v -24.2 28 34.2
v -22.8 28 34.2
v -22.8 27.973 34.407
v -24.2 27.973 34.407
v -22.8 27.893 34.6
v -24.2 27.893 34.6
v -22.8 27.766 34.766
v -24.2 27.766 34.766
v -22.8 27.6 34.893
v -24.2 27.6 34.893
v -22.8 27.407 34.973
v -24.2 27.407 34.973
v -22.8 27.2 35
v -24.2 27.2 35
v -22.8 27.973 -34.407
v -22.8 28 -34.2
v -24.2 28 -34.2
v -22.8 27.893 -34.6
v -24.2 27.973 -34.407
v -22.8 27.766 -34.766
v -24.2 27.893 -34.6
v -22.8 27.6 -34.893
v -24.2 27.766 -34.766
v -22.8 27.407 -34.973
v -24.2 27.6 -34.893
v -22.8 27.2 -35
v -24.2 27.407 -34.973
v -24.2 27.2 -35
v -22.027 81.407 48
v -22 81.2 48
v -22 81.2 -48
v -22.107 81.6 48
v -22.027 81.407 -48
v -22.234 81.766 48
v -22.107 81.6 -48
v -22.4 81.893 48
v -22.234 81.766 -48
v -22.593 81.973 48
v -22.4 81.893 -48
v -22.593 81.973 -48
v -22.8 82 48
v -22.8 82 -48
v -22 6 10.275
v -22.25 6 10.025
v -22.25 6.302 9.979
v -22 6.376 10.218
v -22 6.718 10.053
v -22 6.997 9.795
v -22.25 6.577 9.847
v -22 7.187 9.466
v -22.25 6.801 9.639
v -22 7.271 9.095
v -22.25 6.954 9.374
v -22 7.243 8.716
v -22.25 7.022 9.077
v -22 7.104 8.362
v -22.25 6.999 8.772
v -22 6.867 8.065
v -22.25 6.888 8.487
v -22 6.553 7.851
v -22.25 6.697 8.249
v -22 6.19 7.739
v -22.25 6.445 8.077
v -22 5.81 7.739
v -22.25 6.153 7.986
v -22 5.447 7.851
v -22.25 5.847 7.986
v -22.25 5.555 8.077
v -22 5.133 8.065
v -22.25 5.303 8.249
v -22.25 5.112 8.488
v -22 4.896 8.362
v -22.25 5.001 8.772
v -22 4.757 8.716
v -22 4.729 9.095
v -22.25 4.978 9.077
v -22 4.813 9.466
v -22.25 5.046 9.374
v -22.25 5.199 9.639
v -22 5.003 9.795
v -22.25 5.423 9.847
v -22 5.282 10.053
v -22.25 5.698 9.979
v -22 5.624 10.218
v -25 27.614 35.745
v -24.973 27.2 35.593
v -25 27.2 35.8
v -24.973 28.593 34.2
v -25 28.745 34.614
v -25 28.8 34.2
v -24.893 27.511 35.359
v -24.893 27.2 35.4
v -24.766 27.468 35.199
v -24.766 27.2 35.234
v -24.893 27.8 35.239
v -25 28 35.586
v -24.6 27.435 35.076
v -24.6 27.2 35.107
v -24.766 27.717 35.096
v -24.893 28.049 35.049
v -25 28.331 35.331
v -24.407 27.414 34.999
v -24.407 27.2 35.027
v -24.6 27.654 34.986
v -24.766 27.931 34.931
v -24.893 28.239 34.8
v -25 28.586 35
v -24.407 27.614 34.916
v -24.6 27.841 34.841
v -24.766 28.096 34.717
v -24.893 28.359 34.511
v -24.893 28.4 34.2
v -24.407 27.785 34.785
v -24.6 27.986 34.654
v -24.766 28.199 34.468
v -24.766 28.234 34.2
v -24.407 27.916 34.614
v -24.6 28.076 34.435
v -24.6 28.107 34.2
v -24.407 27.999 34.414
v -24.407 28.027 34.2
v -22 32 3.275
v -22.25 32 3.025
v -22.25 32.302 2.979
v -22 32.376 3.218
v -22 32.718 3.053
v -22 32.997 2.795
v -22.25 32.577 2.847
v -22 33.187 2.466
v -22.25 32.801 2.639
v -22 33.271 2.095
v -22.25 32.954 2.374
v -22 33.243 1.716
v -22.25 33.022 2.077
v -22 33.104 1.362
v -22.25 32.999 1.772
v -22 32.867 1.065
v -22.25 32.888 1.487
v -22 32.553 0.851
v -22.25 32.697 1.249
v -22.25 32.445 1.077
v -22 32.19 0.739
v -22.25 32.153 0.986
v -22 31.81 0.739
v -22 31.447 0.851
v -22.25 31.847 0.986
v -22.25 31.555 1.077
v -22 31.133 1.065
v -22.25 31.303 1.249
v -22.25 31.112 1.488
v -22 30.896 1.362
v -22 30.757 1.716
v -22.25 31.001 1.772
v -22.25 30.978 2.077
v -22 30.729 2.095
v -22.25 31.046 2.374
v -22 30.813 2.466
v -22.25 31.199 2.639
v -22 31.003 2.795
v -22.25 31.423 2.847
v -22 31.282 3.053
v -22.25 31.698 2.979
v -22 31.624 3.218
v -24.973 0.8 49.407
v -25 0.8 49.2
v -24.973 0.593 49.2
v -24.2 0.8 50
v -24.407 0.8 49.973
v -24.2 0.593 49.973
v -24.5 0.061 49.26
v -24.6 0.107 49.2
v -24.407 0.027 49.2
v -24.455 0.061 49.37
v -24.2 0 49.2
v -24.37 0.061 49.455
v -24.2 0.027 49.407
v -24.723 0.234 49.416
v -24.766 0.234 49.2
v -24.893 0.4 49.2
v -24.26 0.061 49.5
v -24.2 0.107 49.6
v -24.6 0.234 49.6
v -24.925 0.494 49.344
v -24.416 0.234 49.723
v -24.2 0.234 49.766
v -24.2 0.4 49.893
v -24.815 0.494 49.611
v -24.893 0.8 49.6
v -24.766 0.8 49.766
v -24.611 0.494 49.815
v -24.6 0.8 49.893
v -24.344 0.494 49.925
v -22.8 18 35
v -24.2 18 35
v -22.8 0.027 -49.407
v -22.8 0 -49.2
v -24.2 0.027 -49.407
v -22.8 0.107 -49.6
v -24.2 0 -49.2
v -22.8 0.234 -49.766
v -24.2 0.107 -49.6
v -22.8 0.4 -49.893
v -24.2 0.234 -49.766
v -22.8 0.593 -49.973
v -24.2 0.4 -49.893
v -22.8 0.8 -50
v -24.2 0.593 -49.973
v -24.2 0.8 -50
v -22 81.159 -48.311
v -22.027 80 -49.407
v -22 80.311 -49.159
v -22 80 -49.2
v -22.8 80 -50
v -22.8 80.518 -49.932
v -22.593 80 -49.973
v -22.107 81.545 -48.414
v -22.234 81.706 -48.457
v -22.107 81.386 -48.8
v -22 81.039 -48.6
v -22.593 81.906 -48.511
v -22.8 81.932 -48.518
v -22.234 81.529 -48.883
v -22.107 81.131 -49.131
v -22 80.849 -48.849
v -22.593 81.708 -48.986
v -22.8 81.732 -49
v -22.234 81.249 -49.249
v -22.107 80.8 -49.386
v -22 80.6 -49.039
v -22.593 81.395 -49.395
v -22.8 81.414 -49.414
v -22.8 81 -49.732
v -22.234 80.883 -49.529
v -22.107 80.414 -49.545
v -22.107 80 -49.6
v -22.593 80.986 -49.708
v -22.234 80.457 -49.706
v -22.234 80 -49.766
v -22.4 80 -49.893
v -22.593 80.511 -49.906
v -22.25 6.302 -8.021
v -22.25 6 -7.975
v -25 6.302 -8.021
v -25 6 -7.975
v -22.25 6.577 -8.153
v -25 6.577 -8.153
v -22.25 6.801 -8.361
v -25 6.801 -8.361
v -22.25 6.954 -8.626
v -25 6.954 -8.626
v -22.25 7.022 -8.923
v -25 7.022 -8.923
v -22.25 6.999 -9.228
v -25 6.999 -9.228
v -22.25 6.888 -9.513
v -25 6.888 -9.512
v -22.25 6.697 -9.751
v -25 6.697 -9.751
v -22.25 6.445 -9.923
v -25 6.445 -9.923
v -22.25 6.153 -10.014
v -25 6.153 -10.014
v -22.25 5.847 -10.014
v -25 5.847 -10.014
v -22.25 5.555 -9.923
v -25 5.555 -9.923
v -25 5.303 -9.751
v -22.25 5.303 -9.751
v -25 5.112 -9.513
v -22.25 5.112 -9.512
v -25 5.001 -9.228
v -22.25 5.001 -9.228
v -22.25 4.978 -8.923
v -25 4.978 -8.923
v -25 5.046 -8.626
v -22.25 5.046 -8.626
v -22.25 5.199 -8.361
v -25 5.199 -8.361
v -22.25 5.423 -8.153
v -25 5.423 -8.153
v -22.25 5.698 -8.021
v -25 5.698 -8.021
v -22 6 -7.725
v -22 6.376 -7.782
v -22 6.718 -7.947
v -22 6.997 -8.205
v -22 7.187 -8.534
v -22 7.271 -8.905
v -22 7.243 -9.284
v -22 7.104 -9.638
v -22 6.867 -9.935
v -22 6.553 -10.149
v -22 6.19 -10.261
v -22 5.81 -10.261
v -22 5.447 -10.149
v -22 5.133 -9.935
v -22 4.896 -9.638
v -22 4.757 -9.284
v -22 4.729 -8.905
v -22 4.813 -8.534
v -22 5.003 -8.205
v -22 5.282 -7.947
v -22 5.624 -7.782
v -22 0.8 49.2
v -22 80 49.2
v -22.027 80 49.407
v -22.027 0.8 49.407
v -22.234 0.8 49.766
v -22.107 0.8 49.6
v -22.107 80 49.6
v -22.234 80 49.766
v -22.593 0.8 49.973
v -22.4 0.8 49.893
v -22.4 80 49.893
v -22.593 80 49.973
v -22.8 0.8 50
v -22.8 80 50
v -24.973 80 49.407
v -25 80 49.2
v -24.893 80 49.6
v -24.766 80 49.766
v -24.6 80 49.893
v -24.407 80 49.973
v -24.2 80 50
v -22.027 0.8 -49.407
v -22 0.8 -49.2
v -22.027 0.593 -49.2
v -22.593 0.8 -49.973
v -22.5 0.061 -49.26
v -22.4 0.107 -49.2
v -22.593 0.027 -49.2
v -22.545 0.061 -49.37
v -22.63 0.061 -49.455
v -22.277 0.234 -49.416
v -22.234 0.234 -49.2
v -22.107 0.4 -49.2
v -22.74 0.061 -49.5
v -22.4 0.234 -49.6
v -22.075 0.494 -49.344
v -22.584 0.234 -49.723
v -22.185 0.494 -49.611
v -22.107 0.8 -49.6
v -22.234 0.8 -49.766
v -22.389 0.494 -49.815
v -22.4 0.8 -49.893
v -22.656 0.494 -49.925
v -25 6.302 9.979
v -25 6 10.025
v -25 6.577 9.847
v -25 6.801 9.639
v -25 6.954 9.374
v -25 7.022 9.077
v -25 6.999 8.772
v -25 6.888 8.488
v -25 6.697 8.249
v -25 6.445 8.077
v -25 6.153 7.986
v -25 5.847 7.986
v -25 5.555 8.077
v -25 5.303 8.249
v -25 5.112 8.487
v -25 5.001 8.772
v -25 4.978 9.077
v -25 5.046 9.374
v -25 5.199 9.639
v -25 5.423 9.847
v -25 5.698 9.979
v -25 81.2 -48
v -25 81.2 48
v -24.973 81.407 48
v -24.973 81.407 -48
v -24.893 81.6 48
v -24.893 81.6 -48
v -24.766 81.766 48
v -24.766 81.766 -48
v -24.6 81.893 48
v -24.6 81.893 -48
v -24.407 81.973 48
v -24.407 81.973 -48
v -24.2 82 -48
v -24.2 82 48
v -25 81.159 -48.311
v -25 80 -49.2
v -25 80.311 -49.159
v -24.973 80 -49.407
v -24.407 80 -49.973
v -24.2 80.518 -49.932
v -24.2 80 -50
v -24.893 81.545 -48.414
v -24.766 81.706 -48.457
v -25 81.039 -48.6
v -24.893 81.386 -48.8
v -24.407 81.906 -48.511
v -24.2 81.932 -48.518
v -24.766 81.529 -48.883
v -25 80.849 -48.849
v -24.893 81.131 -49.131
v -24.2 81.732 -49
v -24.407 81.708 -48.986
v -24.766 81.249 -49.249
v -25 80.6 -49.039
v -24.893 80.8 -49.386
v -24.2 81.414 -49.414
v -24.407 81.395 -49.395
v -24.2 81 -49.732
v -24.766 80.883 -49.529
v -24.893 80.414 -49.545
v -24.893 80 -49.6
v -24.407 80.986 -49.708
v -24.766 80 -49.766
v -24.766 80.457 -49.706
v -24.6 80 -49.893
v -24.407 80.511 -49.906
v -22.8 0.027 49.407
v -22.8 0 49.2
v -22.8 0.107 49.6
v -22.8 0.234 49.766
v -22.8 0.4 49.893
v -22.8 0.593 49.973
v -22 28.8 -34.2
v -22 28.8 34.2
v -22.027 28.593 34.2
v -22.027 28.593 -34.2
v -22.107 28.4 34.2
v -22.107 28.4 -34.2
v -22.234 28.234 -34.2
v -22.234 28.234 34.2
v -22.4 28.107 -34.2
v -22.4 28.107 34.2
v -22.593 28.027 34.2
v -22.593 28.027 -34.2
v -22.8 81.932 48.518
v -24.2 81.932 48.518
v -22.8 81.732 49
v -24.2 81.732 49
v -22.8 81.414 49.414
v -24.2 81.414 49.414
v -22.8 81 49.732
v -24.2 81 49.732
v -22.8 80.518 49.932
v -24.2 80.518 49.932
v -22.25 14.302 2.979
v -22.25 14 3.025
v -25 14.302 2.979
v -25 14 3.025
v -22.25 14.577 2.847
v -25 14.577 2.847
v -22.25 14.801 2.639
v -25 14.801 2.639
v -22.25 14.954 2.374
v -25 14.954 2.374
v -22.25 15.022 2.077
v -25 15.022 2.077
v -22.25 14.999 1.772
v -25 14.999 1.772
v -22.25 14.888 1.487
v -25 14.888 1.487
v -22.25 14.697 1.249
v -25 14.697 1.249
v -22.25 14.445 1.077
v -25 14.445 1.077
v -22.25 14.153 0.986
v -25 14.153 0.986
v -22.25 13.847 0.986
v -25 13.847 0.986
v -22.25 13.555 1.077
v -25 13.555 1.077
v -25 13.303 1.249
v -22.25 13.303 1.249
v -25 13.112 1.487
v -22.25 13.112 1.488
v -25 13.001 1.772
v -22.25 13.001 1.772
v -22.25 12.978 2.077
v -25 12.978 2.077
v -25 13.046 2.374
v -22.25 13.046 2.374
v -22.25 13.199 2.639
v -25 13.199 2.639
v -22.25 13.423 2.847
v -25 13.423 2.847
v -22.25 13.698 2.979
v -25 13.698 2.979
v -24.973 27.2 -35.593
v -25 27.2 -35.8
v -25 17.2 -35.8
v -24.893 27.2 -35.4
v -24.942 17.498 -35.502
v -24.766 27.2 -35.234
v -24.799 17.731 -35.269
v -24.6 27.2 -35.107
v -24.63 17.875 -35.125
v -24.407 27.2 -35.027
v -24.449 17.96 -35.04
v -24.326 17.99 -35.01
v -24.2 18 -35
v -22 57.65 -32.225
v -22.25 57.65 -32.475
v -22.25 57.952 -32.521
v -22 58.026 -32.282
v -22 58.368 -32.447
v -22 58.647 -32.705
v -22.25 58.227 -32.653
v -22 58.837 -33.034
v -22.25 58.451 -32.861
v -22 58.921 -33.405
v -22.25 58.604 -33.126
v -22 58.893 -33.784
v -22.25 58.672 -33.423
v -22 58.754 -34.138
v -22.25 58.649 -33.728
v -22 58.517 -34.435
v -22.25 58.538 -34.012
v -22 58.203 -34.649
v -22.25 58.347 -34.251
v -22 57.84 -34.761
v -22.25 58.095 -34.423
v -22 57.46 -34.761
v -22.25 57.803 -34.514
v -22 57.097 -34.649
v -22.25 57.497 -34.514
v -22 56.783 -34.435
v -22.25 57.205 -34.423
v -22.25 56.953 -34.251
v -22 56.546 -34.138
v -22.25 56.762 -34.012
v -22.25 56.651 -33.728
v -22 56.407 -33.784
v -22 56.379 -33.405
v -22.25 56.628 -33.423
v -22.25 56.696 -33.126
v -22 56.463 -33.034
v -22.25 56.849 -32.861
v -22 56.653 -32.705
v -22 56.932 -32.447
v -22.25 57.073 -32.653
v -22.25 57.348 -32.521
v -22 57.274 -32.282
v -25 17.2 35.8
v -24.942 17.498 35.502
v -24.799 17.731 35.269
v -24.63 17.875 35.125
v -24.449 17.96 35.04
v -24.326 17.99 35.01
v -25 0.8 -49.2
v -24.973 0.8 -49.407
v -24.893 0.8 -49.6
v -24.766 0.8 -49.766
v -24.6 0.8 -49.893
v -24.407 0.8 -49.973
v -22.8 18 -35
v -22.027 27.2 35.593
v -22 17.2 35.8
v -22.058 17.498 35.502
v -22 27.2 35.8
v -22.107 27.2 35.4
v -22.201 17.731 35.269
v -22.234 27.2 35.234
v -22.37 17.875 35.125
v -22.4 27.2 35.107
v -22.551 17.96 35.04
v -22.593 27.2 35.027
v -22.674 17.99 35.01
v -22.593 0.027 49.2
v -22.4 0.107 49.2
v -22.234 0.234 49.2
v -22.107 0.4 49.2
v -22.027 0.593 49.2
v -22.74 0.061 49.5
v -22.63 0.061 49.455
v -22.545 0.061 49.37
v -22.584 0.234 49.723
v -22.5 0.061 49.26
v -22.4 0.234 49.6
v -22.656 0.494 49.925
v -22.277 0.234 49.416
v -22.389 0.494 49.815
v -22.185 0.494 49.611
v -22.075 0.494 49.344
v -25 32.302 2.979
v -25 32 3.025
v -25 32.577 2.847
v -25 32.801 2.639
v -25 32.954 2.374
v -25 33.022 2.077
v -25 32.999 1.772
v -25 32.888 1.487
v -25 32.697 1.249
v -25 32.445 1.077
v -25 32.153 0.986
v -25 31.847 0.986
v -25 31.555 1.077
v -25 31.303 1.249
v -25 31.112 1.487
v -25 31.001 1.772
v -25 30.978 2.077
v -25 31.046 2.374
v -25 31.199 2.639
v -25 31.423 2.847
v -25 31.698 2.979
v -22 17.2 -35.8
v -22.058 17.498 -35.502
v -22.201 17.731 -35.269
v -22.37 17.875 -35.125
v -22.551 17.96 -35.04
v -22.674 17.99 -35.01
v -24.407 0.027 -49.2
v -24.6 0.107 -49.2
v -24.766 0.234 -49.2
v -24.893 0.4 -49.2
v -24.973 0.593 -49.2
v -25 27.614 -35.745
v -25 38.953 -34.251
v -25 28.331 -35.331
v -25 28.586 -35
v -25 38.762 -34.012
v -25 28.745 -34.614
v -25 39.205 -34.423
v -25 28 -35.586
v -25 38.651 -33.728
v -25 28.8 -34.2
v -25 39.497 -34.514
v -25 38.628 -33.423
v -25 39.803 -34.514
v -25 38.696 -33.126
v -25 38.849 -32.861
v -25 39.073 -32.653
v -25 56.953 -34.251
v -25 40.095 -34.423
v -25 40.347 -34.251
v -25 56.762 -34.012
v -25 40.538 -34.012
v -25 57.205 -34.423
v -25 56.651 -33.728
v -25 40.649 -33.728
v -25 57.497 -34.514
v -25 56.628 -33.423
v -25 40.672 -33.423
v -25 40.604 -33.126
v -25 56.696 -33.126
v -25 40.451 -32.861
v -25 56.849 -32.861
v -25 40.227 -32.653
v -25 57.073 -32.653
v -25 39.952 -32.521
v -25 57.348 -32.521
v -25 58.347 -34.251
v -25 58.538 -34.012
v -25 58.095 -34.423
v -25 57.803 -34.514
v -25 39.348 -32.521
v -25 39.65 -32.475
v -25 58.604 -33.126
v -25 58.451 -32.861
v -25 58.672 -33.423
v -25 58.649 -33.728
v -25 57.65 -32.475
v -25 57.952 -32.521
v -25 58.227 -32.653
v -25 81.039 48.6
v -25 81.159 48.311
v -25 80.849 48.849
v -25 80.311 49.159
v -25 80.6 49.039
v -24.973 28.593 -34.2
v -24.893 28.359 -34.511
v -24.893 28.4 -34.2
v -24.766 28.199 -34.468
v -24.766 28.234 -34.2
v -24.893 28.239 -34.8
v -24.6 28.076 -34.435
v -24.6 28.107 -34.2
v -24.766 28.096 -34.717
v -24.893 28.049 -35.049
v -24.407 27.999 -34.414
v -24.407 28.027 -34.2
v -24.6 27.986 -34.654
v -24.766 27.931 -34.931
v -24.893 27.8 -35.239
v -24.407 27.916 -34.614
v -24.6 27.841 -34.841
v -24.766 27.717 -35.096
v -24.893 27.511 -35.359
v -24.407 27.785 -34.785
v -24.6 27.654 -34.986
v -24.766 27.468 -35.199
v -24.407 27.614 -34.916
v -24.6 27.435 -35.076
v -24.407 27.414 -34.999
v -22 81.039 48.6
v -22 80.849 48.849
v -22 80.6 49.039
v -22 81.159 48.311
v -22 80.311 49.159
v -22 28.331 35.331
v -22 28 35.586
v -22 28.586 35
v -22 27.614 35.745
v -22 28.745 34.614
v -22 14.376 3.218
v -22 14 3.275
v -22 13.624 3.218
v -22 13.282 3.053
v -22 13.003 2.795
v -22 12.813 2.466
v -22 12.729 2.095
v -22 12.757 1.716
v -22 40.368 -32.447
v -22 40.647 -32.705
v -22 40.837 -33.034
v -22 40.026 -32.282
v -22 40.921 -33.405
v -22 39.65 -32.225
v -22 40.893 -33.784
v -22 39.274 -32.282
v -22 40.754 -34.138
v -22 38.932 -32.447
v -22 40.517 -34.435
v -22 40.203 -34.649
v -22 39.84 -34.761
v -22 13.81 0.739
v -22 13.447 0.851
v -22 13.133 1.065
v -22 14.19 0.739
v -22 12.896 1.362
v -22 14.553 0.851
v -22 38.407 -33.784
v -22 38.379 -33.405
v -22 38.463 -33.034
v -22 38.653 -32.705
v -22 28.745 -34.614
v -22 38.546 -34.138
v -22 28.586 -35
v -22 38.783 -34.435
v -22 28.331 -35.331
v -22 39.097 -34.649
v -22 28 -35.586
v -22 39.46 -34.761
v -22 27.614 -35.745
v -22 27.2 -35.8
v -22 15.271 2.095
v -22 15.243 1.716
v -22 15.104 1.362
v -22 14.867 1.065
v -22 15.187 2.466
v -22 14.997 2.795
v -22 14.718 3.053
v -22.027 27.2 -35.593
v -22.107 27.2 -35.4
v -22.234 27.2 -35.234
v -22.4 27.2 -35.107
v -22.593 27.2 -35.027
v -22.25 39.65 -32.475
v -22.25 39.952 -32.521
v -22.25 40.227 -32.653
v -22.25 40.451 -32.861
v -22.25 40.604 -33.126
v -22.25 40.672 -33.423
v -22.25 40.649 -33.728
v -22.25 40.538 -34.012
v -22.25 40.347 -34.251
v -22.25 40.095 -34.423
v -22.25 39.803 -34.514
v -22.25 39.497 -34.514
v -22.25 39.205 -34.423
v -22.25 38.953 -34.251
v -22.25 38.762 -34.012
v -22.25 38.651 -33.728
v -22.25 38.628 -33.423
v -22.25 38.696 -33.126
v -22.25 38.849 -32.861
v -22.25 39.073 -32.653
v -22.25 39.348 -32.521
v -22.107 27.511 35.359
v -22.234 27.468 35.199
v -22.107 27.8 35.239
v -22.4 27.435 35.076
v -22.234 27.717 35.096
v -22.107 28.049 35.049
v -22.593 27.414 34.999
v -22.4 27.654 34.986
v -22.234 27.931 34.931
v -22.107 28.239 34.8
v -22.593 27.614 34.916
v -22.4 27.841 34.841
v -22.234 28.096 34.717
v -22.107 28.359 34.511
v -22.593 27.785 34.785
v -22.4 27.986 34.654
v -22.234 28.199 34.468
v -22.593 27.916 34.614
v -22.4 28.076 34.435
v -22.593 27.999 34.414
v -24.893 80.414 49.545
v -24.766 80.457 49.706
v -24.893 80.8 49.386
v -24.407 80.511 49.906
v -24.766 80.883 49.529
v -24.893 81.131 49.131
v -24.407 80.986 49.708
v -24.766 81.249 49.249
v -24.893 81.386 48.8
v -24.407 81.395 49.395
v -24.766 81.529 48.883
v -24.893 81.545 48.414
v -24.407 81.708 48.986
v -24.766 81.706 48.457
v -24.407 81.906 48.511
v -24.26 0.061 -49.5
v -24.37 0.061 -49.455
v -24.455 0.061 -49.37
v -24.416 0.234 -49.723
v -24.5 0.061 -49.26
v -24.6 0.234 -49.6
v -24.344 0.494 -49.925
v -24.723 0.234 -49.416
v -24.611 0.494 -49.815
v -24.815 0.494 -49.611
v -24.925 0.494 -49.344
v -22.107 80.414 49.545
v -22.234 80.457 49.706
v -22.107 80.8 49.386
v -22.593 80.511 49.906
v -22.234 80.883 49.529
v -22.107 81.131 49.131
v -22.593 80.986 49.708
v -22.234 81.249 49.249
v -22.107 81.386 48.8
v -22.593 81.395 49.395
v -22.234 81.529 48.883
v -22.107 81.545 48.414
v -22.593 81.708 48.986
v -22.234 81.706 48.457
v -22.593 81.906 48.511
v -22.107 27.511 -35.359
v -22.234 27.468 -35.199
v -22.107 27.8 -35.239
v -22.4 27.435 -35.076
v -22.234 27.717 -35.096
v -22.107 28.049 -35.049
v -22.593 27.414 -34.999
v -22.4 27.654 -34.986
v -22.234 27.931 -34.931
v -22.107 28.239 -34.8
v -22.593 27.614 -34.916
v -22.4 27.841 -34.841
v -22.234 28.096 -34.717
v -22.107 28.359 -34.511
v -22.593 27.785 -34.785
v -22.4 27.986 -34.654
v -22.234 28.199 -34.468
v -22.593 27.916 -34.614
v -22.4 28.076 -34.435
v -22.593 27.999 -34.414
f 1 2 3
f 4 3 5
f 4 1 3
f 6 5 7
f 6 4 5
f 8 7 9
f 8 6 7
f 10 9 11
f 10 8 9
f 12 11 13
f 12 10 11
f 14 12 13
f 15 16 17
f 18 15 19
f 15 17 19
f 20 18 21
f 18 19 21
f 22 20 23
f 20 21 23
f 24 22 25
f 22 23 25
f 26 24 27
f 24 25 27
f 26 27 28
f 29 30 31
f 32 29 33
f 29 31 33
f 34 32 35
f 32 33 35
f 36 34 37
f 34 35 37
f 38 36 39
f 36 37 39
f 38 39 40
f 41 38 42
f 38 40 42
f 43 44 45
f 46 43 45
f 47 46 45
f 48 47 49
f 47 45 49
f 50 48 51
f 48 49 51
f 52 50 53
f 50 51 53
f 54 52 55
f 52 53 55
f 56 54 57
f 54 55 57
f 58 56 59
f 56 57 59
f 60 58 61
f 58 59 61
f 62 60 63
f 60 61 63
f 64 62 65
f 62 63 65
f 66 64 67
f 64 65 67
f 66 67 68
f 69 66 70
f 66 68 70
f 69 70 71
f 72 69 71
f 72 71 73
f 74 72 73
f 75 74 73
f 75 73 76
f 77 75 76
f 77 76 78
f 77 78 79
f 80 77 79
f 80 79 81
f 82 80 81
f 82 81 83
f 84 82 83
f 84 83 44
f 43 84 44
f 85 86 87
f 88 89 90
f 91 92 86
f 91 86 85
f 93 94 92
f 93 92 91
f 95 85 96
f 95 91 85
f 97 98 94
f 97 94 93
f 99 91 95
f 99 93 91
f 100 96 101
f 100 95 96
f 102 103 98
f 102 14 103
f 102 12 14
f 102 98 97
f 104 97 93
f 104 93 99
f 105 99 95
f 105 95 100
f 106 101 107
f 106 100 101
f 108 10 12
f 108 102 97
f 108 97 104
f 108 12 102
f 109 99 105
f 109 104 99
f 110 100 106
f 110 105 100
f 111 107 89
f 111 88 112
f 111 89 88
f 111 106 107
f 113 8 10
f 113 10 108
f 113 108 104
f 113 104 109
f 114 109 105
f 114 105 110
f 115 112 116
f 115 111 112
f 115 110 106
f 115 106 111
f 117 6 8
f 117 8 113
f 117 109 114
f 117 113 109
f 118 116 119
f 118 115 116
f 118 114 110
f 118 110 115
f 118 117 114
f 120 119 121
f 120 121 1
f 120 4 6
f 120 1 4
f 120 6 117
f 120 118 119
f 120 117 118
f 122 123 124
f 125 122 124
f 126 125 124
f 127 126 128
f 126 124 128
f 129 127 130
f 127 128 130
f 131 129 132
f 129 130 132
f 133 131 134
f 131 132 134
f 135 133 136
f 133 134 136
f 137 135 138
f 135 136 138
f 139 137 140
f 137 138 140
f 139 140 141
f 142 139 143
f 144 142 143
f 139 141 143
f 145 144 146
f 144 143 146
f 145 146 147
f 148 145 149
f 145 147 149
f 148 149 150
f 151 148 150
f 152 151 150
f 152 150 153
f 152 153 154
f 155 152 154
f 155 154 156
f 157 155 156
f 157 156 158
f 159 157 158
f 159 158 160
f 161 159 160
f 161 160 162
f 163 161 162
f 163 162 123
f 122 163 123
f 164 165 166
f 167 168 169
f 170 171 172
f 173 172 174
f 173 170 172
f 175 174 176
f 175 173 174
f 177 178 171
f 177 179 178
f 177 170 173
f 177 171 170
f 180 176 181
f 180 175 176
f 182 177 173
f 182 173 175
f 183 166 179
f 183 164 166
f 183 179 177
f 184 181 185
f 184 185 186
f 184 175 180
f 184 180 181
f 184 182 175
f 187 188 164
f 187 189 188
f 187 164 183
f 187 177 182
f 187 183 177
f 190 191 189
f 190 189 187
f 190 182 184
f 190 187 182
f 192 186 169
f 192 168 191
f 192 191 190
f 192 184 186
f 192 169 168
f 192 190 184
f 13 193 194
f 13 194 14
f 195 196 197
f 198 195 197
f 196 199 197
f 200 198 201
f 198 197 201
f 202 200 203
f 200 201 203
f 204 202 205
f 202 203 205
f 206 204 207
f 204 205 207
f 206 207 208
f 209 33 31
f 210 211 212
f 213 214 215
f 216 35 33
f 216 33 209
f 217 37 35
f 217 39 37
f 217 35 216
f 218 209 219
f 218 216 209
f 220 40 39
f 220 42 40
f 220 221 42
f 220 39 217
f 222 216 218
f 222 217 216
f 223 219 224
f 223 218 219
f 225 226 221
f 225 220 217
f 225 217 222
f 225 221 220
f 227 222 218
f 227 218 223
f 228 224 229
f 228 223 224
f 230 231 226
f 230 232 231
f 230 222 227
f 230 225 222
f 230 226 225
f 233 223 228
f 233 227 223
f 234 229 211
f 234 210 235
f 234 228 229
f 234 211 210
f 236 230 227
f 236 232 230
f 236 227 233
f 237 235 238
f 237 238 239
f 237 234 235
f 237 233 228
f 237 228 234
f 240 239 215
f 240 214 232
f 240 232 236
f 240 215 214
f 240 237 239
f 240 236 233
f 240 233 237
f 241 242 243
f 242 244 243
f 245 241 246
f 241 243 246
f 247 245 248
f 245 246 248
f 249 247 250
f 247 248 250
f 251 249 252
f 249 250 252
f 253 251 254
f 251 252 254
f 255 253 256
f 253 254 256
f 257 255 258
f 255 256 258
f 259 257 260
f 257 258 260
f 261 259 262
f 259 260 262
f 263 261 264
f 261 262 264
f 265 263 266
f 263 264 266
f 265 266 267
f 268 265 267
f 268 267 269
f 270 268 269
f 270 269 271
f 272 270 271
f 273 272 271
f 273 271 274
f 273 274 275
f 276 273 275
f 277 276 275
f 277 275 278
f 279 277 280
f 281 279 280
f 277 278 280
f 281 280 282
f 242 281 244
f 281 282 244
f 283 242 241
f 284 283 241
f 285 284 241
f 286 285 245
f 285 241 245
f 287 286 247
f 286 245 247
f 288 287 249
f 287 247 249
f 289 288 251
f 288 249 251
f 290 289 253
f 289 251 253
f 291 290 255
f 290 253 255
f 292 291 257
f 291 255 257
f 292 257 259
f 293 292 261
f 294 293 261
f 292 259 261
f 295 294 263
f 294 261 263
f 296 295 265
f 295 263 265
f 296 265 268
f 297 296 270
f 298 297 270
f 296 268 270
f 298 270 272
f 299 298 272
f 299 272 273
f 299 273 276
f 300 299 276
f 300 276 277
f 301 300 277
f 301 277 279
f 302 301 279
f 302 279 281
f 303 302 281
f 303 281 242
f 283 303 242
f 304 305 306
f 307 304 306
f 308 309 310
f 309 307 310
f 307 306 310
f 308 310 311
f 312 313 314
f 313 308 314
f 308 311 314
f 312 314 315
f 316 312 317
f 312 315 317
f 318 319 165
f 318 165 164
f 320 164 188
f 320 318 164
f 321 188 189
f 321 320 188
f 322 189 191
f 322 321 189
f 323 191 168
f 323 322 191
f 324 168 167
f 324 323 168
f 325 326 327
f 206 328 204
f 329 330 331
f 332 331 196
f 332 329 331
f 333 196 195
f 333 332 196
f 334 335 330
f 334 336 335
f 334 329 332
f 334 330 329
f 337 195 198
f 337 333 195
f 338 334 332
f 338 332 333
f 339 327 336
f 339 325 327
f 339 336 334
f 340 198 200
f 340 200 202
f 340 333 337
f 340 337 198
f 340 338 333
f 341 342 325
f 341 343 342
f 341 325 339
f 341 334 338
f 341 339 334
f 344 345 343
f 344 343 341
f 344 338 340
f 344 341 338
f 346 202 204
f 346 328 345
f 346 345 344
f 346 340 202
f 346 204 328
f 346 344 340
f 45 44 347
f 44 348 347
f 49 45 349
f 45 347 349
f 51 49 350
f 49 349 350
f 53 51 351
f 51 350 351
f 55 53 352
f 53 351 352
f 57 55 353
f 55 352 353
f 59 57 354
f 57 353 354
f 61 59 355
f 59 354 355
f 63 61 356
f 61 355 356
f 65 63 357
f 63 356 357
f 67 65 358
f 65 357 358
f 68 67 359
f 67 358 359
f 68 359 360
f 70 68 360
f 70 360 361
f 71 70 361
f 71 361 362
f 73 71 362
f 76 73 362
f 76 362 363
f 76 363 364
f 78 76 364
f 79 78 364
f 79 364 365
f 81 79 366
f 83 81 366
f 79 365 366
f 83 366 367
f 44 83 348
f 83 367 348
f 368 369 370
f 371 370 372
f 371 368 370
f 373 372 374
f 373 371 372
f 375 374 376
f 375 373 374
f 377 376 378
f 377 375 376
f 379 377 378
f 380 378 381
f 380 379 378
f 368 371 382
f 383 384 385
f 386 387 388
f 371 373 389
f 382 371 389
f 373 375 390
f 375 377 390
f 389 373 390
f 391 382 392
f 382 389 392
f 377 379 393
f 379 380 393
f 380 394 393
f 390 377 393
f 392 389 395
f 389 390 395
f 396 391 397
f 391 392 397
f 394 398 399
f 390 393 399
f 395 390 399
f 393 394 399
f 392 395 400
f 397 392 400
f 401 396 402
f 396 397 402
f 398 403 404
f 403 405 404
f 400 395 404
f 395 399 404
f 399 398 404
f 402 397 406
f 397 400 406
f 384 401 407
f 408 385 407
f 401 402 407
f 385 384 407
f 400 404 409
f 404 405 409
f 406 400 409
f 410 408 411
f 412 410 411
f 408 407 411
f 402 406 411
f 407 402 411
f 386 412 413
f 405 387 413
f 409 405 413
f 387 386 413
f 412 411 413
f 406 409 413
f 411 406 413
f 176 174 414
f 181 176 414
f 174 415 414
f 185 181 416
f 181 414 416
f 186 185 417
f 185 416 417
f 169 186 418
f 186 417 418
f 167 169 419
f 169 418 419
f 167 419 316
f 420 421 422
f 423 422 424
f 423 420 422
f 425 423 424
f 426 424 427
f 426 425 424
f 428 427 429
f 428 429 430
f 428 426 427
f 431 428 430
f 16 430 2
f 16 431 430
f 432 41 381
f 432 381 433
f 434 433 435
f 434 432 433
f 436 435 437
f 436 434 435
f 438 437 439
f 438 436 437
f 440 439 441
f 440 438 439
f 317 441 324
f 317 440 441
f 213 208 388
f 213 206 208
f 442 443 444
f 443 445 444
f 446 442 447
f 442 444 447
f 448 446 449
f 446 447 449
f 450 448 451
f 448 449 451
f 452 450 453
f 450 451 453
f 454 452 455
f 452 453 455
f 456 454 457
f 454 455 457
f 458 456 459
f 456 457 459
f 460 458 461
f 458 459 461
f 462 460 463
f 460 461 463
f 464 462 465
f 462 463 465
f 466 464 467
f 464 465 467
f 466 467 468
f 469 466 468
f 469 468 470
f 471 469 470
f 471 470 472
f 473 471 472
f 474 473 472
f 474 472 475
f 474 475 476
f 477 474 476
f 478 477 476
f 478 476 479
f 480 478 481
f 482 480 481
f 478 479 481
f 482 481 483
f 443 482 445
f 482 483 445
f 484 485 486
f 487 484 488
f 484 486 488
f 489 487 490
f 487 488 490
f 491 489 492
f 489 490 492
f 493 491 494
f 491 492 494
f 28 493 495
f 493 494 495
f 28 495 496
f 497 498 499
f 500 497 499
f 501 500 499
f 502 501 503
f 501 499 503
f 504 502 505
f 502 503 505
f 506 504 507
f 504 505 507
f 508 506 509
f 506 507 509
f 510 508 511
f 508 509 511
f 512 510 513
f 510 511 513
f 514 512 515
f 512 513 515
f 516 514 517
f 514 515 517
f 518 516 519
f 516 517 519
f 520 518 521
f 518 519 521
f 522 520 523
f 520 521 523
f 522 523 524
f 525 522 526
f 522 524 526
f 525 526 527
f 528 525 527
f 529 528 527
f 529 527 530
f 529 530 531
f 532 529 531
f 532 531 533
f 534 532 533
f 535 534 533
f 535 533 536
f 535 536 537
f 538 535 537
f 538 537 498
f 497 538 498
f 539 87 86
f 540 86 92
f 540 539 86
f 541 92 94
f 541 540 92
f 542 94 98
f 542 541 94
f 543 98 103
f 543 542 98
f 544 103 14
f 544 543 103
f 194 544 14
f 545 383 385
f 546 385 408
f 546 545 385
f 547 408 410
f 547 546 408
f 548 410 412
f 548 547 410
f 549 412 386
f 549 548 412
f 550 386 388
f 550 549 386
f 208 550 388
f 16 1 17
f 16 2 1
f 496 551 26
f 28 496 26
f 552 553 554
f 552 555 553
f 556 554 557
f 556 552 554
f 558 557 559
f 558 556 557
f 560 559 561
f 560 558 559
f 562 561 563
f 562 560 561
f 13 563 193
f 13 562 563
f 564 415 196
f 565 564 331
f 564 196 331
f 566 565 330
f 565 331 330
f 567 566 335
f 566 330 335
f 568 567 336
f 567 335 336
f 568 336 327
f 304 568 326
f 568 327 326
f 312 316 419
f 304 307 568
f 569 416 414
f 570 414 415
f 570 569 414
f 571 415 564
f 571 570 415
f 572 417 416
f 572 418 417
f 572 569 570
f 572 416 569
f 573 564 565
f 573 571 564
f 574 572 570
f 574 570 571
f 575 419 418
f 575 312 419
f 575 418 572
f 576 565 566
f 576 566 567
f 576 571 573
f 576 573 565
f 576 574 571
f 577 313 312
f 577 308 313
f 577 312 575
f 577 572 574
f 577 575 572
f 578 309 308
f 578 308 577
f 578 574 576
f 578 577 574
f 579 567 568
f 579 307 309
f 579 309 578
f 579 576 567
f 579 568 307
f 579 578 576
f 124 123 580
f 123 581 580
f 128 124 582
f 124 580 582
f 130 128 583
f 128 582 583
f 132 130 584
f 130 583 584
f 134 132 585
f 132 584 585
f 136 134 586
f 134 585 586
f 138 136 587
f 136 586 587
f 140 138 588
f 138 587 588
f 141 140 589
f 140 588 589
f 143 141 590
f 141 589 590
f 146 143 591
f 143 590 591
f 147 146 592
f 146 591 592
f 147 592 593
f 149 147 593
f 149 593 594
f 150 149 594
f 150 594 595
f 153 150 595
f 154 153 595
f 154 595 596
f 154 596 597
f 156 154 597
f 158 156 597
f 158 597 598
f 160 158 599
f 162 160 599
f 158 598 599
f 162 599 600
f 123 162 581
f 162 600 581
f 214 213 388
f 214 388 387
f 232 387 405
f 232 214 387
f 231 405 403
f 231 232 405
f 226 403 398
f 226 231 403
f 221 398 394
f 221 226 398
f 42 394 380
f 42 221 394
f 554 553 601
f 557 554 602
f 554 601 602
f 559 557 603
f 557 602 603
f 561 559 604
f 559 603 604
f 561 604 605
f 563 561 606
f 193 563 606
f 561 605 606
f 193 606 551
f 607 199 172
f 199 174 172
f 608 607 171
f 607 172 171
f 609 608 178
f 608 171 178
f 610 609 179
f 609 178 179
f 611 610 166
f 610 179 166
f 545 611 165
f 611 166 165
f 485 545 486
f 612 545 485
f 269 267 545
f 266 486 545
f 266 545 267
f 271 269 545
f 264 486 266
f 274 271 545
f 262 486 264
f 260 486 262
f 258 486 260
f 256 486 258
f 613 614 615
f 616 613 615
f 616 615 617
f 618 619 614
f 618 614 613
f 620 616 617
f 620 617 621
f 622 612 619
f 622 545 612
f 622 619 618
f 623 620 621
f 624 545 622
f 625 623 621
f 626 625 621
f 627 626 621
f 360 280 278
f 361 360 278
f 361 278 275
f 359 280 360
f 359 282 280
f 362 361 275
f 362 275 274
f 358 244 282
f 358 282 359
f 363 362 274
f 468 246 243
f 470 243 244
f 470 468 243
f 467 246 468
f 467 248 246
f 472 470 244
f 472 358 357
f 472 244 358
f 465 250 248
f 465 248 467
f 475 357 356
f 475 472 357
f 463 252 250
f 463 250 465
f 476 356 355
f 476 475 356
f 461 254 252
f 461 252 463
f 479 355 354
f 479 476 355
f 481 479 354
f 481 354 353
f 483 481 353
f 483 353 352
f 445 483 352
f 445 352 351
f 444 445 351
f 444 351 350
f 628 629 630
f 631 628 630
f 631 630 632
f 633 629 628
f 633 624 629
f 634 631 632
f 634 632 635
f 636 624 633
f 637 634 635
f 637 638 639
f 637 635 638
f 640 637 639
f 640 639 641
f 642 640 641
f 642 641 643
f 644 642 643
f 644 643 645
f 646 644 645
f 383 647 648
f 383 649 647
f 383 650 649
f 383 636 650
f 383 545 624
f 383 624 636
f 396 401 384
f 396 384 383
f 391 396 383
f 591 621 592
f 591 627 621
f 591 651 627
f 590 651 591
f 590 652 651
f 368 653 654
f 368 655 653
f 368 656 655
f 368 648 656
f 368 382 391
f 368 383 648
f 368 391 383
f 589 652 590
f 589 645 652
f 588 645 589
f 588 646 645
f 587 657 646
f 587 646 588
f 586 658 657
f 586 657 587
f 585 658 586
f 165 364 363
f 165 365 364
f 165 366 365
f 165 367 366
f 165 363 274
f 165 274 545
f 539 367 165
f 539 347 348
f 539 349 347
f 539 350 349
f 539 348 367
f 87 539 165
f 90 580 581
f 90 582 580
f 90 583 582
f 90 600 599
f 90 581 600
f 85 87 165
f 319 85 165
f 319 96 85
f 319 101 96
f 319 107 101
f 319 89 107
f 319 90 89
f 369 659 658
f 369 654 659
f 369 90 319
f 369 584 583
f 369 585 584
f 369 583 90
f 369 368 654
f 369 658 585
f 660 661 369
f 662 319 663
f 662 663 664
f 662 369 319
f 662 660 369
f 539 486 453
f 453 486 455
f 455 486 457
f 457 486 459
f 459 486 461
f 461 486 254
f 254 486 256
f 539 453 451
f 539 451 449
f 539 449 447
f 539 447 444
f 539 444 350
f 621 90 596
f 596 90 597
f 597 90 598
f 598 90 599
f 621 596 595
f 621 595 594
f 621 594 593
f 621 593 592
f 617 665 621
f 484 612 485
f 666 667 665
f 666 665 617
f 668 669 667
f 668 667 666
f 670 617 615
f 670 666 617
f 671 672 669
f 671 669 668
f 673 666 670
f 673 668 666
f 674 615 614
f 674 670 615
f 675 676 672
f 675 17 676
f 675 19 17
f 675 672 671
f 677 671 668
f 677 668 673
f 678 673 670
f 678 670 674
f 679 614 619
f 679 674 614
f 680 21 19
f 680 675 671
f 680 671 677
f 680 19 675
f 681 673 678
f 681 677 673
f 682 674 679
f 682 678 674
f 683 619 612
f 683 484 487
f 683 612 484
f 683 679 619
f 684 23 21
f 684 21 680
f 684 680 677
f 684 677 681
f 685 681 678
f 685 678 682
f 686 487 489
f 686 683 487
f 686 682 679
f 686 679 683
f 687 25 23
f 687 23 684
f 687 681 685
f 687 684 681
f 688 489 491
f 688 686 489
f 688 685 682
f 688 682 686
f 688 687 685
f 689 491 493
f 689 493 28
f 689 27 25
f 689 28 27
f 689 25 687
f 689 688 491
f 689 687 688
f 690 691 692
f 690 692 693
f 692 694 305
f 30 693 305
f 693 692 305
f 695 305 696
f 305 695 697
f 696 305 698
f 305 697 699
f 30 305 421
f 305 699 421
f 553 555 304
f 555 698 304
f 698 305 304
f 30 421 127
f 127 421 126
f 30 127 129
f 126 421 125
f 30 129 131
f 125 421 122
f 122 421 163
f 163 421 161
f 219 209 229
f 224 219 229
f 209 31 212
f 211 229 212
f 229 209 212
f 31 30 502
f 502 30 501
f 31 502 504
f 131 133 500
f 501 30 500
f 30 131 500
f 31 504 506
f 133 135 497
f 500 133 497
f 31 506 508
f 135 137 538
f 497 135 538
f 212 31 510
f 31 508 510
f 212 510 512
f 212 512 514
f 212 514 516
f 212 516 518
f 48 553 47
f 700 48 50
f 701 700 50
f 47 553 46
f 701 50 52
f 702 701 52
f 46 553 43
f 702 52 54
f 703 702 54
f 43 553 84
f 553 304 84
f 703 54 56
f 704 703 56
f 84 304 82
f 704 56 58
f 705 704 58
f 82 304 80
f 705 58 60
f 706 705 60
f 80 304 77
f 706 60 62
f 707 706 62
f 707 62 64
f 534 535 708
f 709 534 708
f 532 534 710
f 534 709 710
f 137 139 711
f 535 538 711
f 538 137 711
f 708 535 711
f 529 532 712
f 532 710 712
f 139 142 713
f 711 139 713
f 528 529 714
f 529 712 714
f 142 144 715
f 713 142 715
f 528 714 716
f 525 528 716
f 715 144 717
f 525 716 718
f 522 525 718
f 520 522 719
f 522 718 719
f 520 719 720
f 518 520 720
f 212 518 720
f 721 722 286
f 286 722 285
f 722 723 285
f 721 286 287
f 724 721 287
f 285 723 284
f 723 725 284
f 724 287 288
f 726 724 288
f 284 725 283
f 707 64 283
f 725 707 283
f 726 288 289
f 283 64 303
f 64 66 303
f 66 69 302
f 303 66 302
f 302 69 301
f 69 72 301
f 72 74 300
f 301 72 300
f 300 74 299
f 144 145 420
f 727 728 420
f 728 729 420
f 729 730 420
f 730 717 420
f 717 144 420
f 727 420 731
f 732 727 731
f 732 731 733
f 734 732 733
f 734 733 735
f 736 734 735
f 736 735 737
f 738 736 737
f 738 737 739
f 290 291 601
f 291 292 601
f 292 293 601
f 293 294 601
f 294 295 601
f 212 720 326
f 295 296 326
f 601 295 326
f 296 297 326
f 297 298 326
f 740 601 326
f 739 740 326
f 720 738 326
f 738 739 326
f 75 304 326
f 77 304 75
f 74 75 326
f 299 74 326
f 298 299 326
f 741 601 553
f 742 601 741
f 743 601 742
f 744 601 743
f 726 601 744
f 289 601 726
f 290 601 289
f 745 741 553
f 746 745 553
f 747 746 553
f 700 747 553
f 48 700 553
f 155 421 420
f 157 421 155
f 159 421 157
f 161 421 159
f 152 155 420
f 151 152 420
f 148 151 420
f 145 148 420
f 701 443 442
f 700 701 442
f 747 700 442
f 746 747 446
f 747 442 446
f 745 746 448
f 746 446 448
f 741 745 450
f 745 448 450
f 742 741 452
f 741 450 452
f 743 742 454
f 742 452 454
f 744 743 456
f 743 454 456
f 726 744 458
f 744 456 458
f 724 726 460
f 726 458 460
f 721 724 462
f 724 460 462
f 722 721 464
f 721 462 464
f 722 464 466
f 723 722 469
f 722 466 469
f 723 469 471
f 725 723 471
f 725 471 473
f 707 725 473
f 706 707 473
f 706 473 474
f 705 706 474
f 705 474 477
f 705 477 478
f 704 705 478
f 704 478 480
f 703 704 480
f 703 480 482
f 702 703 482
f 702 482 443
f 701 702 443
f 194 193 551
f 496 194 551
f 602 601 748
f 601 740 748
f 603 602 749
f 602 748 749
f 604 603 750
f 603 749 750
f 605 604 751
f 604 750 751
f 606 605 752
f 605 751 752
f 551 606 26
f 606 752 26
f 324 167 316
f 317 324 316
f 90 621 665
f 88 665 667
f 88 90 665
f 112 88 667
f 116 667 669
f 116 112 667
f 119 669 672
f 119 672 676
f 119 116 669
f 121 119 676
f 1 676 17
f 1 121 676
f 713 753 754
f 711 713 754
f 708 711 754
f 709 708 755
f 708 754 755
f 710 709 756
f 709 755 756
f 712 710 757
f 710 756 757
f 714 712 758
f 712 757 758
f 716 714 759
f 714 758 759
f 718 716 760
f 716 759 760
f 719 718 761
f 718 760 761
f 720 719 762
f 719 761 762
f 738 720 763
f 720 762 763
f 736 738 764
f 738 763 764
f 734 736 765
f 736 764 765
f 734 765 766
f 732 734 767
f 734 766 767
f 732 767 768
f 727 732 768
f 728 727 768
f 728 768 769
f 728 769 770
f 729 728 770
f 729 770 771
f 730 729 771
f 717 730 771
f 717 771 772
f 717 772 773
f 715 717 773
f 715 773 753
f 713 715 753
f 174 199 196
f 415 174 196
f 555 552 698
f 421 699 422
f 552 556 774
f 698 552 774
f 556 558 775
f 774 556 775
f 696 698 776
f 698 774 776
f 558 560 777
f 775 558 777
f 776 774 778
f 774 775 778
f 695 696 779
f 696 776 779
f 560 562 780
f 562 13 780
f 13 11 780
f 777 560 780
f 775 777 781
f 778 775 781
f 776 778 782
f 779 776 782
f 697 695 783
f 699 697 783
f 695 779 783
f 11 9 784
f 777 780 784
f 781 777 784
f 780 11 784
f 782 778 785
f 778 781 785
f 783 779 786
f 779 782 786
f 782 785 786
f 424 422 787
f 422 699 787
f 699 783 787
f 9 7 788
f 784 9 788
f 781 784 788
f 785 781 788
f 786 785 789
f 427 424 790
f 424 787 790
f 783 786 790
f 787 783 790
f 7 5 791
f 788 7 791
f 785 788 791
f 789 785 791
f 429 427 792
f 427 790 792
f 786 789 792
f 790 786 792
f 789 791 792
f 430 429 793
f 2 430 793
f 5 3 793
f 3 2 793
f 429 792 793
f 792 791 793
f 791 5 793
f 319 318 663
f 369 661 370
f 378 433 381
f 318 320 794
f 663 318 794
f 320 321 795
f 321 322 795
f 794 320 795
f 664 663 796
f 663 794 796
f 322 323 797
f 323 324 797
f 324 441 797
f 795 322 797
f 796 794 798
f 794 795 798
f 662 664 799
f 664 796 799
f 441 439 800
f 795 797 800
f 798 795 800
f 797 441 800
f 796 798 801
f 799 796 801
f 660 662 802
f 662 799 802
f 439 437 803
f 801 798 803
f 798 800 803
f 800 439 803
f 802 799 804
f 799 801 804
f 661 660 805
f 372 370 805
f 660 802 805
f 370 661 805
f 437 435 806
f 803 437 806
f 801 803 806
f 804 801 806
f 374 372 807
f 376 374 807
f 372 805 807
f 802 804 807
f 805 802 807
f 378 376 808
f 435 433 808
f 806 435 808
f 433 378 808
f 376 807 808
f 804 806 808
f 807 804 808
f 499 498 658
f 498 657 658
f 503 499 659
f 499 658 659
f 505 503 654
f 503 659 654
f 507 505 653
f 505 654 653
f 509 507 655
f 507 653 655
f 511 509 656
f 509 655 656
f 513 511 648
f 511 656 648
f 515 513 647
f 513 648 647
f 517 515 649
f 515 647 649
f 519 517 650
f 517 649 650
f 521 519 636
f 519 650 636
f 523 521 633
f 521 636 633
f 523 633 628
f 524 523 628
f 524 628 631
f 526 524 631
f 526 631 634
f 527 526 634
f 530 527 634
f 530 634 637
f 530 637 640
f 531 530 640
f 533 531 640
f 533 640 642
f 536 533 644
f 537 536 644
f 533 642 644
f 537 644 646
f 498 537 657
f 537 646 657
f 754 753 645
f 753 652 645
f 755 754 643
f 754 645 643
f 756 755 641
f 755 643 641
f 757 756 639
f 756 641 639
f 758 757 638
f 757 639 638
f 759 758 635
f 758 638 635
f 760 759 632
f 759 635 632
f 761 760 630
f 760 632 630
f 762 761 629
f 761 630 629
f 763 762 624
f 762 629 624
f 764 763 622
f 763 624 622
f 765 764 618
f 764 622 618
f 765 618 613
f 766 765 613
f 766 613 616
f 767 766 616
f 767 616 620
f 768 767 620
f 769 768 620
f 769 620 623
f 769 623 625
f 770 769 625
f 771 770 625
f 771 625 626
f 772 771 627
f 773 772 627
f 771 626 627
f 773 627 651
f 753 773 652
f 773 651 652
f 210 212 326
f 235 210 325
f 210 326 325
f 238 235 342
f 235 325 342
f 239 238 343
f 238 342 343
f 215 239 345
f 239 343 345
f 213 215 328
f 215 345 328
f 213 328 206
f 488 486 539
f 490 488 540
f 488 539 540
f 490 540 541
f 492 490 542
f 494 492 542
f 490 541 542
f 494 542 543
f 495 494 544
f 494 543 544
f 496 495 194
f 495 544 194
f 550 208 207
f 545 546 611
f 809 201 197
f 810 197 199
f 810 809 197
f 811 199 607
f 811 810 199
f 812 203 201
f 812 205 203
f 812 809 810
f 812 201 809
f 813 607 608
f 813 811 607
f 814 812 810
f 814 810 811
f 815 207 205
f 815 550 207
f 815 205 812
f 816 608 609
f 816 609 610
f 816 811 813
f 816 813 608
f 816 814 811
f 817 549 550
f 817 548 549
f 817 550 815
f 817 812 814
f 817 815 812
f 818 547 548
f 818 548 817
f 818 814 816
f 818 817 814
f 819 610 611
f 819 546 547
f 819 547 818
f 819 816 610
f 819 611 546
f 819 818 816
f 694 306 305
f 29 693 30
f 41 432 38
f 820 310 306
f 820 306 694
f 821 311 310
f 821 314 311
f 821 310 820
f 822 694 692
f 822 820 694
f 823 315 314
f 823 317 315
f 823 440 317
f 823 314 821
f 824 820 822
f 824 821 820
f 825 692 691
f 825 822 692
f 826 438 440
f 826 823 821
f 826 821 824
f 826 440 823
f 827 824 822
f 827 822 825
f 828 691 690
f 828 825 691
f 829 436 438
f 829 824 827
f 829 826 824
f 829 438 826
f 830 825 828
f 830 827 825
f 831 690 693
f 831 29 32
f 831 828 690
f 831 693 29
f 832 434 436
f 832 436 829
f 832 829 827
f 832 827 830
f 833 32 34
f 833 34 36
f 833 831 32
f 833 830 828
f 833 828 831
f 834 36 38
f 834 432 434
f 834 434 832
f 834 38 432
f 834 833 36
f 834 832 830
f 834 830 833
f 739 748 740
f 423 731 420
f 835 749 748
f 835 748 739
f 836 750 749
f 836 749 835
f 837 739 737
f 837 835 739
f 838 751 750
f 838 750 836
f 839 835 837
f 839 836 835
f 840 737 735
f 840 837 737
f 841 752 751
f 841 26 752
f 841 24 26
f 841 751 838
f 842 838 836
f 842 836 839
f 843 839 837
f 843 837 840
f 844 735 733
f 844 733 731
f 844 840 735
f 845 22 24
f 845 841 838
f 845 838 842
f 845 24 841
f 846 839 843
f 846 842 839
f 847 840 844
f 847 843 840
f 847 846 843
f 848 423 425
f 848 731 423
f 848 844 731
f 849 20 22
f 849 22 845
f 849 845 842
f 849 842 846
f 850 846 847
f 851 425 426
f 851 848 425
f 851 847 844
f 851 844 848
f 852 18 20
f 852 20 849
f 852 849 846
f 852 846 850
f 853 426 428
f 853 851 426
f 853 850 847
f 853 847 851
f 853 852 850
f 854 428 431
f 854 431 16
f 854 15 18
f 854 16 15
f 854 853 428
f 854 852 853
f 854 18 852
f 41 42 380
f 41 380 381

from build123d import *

# Parameters (mm, degrees)
SKETCH_1_W                     = 50
SKETCH_1_H                     = 100
EXTRUDE_1_DEPTH                = 2
SKETCH_2_W                     = 3
SKETCH_2_H                     = 100
EXTRUDE_2_DEPTH                = 80
SKETCH_3_W                     = 2
SKETCH_3_H                     = 66.7
EXTRUDE_3_DEPTH                = 70
CUT_EXTRUDE_4_REACH            = 162.465
SKETCH_8_W                     = 2
SKETCH_8_H                     = 66.7
EXTRUDE_4_DEPTH                = 70
CUT_EXTRUDE_5_REACH            = 140.25
HOLE_WIZARD_M3_1_D             = 2.5
HOLE_WIZARD_M3_1_DEPTH         = 2
HOLE_WIZARD_M3_1_CSINK_D       = 3.05
HOLE_WIZARD_M3_1_CSINK_ANGLE   = 90
FILLET_1_R                     = 2
CUT_EXTRUDE_6_REACH            = 140.25
SKETCH_12_R                    = 11
CUT_EXTRUDE_7_REACH            = 162.465
SKETCH_13_R                    = 14.5
SKETCH_14_W                    = 2
SKETCH_14_H                    = 66.7
EXTRUDE_5_DEPTH                = 70
CUT_EXTRUDE_8_REACH            = 156.14
SKETCH_15_R                    = 5.1
CUT_EXTRUDE_9_DEPTH            = 155.140358116
CUT_EXTRUDE_9_DEPTH_BACK       = 155.140358116
SKETCH_19_W                    = 2
SKETCH_19_H                    = 66.7
CUT_EXTRUDE_10_DEPTH           = 119.844436134
FILLET_2_R                     = 2
CUT_EXTRUDE_12_DEPTH           = 134.88427839
CUT_EXTRUDE_12_DEPTH_BACK      = 134.88427839
SKETCH_20_W                    = 47
SKETCH_20_H                    = 100
SKETCH_20_W_2                  = 70
SKETCH_20_H_2                  = 2
HOLE_WIZARD_M2_5_1_D           = 2.05
HOLE_WIZARD_M2_5_1_CSINK_D     = 2.55
HOLE_WIZARD_M2_5_1_CSINK_ANGLE = 90
SKETCH_23_W                    = 70
SKETCH_23_H                    = 10
CUT_EXTRUDE_13_DEPTH           = 97.088500873
FILLET_3_R                     = 0.8
FILLET_4_R                     = 0.8


with BuildPart() as part:
    # 草图1 → 凸台-拉伸1 (new body)
    with BuildSketch(Plane(origin=(0, 0, 0), x_dir=(1, 0, 0), z_dir=(0, 1, 0))):
        Rectangle(SKETCH_1_W, SKETCH_1_H)
    extrude(amount=EXTRUDE_1_DEPTH)

    # 草图2 → 凸台-拉伸2 (add)
    with BuildSketch(Plane(origin=(0, 2, 0), x_dir=(1, 0, 0), z_dir=(0, 1, 0))):
        with Locations((-23.5, 0)):
            Rectangle(SKETCH_2_W, SKETCH_2_H)
    extrude(amount=EXTRUDE_2_DEPTH)

    # 草图3 → 凸台-拉伸3 (add)
    with BuildSketch(Plane.ZY.offset(25)):
        with Locations((-49, 48.65)):
            Rectangle(SKETCH_3_W, SKETCH_3_H)
    extrude(amount=EXTRUDE_3_DEPTH)

    # 草图4 → 切除-拉伸4 (cut, up to next)
    with BuildSketch(Plane(origin=(0, 0, -50), x_dir=(-1, 0, 0), z_dir=(0, 0, -1)), mode=Mode.PRIVATE) as cut_extrude_4_sk1:
        with BuildLine():
            Line((95, 82), (61.65, 82))
            ThreePointArc((61.65, 82), (85.232011153, 72.232011153), (95, 48.65))
            Line((95, 48.65), (95, 82))
        make_face()
    cut_extrude_4_tool1 = extrude(cut_extrude_4_sk1.sketch, amount=-CUT_EXTRUDE_4_REACH, mode=Mode.PRIVATE) & part.part
    # 草图4 → 切除-拉伸4 (cut, up to next)
    with BuildSketch(Plane(origin=(0, 0, -50), x_dir=(-1, 0, 0), z_dir=(0, 0, -1)), mode=Mode.PRIVATE) as cut_extrude_4_sk2:
        with BuildLine():
            ThreePointArc((95, 48.65), (85.232011153, 25.067988847), (61.65, 15.3))
            Line((61.65, 15.3), (95, 15.3))
            Line((95, 15.3), (95, 48.65))
        make_face()
    cut_extrude_4_tool2 = extrude(cut_extrude_4_sk2.sketch, amount=-CUT_EXTRUDE_4_REACH, mode=Mode.PRIVATE) & part.part
    add(cut_extrude_4_tool1.solids().sort_by_distance((-87.550679, 74.550679, -50))[0], mode=Mode.SUBTRACT)
    add(cut_extrude_4_tool2.solids().sort_by_distance((-87.550679, 22.749321, -50))[0], mode=Mode.SUBTRACT)

    # 草图8 → 凸台-拉伸4 (add)
    with BuildSketch(Plane.ZY.offset(25)):
        with Locations((7, 48.65)):
            Rectangle(SKETCH_8_W, SKETCH_8_H)
    extrude(amount=EXTRUDE_4_DEPTH)

    # 草图9 → 切除-拉伸5 (cut, up to next)
    with BuildSketch(Plane.XY.offset(8), mode=Mode.PRIVATE) as cut_extrude_5_sk1:
        with BuildLine():
            ThreePointArc((-95, 48.65), (-85.232011153, 72.232011153), (-61.65, 82))
            Line((-61.65, 82), (-95, 82))
            Line((-95, 82), (-95, 48.65))
        make_face()
    cut_extrude_5_tool1 = extrude(cut_extrude_5_sk1.sketch, amount=-CUT_EXTRUDE_5_REACH, mode=Mode.PRIVATE) & part.part
    # 草图9 → 切除-拉伸5 (cut, up to next)
    with BuildSketch(Plane.XY.offset(8), mode=Mode.PRIVATE) as cut_extrude_5_sk2:
        with BuildLine():
            ThreePointArc((-61.65, 15.3), (-85.232011153, 25.067988847), (-95, 48.65))
            Line((-95, 48.65), (-95, 15.3))
            Line((-95, 15.3), (-61.65, 15.3))
        make_face()
    cut_extrude_5_tool2 = extrude(cut_extrude_5_sk2.sketch, amount=-CUT_EXTRUDE_5_REACH, mode=Mode.PRIVATE) & part.part
    add(cut_extrude_5_tool1.solids().sort_by_distance((-87.550679, 74.550679, 8))[0], mode=Mode.SUBTRACT)
    add(cut_extrude_5_tool2.solids().sort_by_distance((-87.550679, 22.749321, 8))[0], mode=Mode.SUBTRACT)

    # M3 螺纹孔1
    with Locations(Plane.XY.offset(8)):
        with Locations((-78.970508076, 38.65), (-61.65, 68.65), (-44.329491924, 38.65)):
            CounterSinkHole(HOLE_WIZARD_M3_1_D / 2, HOLE_WIZARD_M3_1_CSINK_D / 2, depth=HOLE_WIZARD_M3_1_DEPTH, counter_sink_angle=HOLE_WIZARD_M3_1_CSINK_ANGLE)

    # 圆角1
    fillet_1_edges = [part.edges().sort_by_distance(p)[0] for p in [
        (-23.5, 82, 50),
        (25, 1, 50),
        (25, 1, -50),
    ]]
    fillet(fillet_1_edges, radius=FILLET_1_R)

    # 草图12 → 切除-拉伸6 (cut, up to next)
    with BuildSketch(Plane.XY.offset(8), mode=Mode.PRIVATE) as cut_extrude_6_sk1:
        with Locations((-61.65, 48.65)):
            Circle(SKETCH_12_R)
    cut_extrude_6_tool1 = extrude(cut_extrude_6_sk1.sketch, amount=-CUT_EXTRUDE_6_REACH, mode=Mode.PRIVATE) & part.part
    add(cut_extrude_6_tool1.solids().sort_by_distance((-61.65, 48.65, 8))[0], mode=Mode.SUBTRACT)

    # 草图13 → 切除-拉伸7 (cut, up to next)
    with BuildSketch(Plane(origin=(0, 0, -50), x_dir=(-1, 0, 0), z_dir=(0, 0, -1)), mode=Mode.PRIVATE) as cut_extrude_7_sk1:
        with Locations((61.65, 48.65)):
            Circle(SKETCH_13_R)
    cut_extrude_7_tool1 = extrude(cut_extrude_7_sk1.sketch, amount=-CUT_EXTRUDE_7_REACH, mode=Mode.PRIVATE) & part.part
    add(cut_extrude_7_tool1.solids().sort_by_distance((-61.65, 48.65, -50))[0], mode=Mode.SUBTRACT)

    # 草图14 → 凸台-拉伸5 (add)
    with BuildSketch(Plane.ZY.offset(25)):
        with Locations((-38.5, 48.65)):
            Rectangle(SKETCH_14_W, SKETCH_14_H)
    extrude(amount=EXTRUDE_5_DEPTH)

    # 草图15 → 切除-拉伸8 (cut, up to next)
    with BuildSketch(Plane(origin=(0, 0, -39.5), x_dir=(-1, 0, 0), z_dir=(0, 0, -1)), mode=Mode.PRIVATE) as cut_extrude_8_sk1:
        with Locations(Location((61.65, 48.65, 0), (0, 0, 90))):
            Circle(SKETCH_15_R)
    cut_extrude_8_tool1 = extrude(cut_extrude_8_sk1.sketch, amount=-CUT_EXTRUDE_8_REACH, mode=Mode.PRIVATE) & part.part
    add(cut_extrude_8_tool1.solids().sort_by_distance((-61.65, 48.65, -39.5))[0], mode=Mode.SUBTRACT)

    # 草图18 → 切除-拉伸9 (cut, two sides: drawn at the far end of the back side and taken through both)
    with BuildSketch(Plane(origin=(0, 0, -39.5), x_dir=(-1, 0, 0), z_dir=(0, 0, -1)).offset(-CUT_EXTRUDE_9_DEPTH_BACK)):
        with BuildLine():
            Line((95, 15.3), (95, 48.65))
            ThreePointArc((95, 48.65), (85.232011153, 25.067988847), (61.65, 15.3))
            Line((61.65, 15.3), (95, 15.3))
        make_face()
        with BuildLine():
            Line((95, 48.65), (95, 82))
            Line((95, 82), (61.65, 82))
            ThreePointArc((61.65, 82), (85.232011153, 72.232011153), (95, 48.65))
        make_face()
    extrude(amount=CUT_EXTRUDE_9_DEPTH + CUT_EXTRUDE_9_DEPTH_BACK, mode=Mode.SUBTRACT)

    # 草图19 → 切除-拉伸10 (cut, through all)
    with BuildSketch(Plane.ZY.offset(25)):
        with Locations((-49, 48.65)):
            Rectangle(SKETCH_19_W, SKETCH_19_H)
    extrude(amount=CUT_EXTRUDE_10_DEPTH, mode=Mode.SUBTRACT)

    # 圆角2
    fillet_2_edges = [part.edges().sort_by_distance(p)[0] for p in [
        (-23.5, 82, -50),
    ]]
    fillet(fillet_2_edges, radius=FILLET_2_R)

    # 草图20 → 切除-拉伸12 (cut, two sides: drawn at the far end of the back side and taken through both)
    with BuildSketch(Plane(origin=(0, 2, 0), x_dir=(1, 0, 0), z_dir=(0, 1, 0)).offset(-CUT_EXTRUDE_12_DEPTH_BACK)):
        with Locations((1.5, 0)):
            Rectangle(SKETCH_20_W, SKETCH_20_H)
        with Locations((-60, 38.5)):
            Rectangle(SKETCH_20_W_2, SKETCH_20_H_2)
        with Locations((-60, -7)):
            Rectangle(SKETCH_20_W_2, SKETCH_20_H_2)
    extrude(amount=CUT_EXTRUDE_12_DEPTH + CUT_EXTRUDE_12_DEPTH_BACK, mode=Mode.SUBTRACT)

    # M2.5 螺纹孔1 (through all)
    with Locations(Plane(origin=(-22, 0, 0), x_dir=(0, 0, -1), z_dir=(1, 0, 0))):
        with Locations((-2, 14), (-9, 6), (9, 6), (33.5, 57.65), (33.5, 39.65), (-2, 32)):
            CounterSinkHole(HOLE_WIZARD_M2_5_1_D / 2, HOLE_WIZARD_M2_5_1_CSINK_D / 2, counter_sink_angle=HOLE_WIZARD_M2_5_1_CSINK_ANGLE)

    # 草图23 → 切除-拉伸13 (cut, through all)
    with BuildSketch(Plane(origin=(-22, 0, 0), x_dir=(0, 0, -1), z_dir=(1, 0, 0))):
        with Locations((0, 23)):
            Rectangle(SKETCH_23_W, SKETCH_23_H)
    extrude(amount=-CUT_EXTRUDE_13_DEPTH, mode=Mode.SUBTRACT)

    # 圆角3
    fillet_3_edges = [part.edges().sort_by_distance(p)[0] for p in [
        (-22, 82, 0),
        (-22, 40, 50),
        (-22, 81.414213562, 49.414213562),
        (-25, 40, 50),
        (-25, 81.414213562, 49.414213562),
        (-25, 40, -50),
        (-25, 81.414213562, -49.414213562),
        (-22, 40, -50),
        (-22, 81.414213562, -49.414213562),
        (-25, 23, 35),
        (-25, 28, 0),
        (-23.5, 28, 35),
        (-25, 23, -35),
        (-23.5, 28, -35),
        (-25, 18, 0),
        (-22, 23, 35),
        (-22, 18, 0),
        (-22, 23, -35),
        (-22, 28, 0),
        (-25, 82, 0),
    ]]
    fillet(fillet_3_edges, radius=FILLET_3_R)

    # 圆角4
    fillet_4_edges = [part.edges().sort_by_distance(p)[0] for p in [
        (-25, 0, 0),
        (-22, 0, 0),
        (-23.5, 0, 50),
        (-23.5, 0, -50),
        (-22.234314575, 0, -49.765685425),
        (-24.765685425, 0, -49.765685425),
        (-22.234314575, 0, 49.765685425),
        (-24.765685425, 0, 49.765685425),
    ]]
    fillet(fillet_4_edges, radius=FILLET_4_R)


solid = part.part
